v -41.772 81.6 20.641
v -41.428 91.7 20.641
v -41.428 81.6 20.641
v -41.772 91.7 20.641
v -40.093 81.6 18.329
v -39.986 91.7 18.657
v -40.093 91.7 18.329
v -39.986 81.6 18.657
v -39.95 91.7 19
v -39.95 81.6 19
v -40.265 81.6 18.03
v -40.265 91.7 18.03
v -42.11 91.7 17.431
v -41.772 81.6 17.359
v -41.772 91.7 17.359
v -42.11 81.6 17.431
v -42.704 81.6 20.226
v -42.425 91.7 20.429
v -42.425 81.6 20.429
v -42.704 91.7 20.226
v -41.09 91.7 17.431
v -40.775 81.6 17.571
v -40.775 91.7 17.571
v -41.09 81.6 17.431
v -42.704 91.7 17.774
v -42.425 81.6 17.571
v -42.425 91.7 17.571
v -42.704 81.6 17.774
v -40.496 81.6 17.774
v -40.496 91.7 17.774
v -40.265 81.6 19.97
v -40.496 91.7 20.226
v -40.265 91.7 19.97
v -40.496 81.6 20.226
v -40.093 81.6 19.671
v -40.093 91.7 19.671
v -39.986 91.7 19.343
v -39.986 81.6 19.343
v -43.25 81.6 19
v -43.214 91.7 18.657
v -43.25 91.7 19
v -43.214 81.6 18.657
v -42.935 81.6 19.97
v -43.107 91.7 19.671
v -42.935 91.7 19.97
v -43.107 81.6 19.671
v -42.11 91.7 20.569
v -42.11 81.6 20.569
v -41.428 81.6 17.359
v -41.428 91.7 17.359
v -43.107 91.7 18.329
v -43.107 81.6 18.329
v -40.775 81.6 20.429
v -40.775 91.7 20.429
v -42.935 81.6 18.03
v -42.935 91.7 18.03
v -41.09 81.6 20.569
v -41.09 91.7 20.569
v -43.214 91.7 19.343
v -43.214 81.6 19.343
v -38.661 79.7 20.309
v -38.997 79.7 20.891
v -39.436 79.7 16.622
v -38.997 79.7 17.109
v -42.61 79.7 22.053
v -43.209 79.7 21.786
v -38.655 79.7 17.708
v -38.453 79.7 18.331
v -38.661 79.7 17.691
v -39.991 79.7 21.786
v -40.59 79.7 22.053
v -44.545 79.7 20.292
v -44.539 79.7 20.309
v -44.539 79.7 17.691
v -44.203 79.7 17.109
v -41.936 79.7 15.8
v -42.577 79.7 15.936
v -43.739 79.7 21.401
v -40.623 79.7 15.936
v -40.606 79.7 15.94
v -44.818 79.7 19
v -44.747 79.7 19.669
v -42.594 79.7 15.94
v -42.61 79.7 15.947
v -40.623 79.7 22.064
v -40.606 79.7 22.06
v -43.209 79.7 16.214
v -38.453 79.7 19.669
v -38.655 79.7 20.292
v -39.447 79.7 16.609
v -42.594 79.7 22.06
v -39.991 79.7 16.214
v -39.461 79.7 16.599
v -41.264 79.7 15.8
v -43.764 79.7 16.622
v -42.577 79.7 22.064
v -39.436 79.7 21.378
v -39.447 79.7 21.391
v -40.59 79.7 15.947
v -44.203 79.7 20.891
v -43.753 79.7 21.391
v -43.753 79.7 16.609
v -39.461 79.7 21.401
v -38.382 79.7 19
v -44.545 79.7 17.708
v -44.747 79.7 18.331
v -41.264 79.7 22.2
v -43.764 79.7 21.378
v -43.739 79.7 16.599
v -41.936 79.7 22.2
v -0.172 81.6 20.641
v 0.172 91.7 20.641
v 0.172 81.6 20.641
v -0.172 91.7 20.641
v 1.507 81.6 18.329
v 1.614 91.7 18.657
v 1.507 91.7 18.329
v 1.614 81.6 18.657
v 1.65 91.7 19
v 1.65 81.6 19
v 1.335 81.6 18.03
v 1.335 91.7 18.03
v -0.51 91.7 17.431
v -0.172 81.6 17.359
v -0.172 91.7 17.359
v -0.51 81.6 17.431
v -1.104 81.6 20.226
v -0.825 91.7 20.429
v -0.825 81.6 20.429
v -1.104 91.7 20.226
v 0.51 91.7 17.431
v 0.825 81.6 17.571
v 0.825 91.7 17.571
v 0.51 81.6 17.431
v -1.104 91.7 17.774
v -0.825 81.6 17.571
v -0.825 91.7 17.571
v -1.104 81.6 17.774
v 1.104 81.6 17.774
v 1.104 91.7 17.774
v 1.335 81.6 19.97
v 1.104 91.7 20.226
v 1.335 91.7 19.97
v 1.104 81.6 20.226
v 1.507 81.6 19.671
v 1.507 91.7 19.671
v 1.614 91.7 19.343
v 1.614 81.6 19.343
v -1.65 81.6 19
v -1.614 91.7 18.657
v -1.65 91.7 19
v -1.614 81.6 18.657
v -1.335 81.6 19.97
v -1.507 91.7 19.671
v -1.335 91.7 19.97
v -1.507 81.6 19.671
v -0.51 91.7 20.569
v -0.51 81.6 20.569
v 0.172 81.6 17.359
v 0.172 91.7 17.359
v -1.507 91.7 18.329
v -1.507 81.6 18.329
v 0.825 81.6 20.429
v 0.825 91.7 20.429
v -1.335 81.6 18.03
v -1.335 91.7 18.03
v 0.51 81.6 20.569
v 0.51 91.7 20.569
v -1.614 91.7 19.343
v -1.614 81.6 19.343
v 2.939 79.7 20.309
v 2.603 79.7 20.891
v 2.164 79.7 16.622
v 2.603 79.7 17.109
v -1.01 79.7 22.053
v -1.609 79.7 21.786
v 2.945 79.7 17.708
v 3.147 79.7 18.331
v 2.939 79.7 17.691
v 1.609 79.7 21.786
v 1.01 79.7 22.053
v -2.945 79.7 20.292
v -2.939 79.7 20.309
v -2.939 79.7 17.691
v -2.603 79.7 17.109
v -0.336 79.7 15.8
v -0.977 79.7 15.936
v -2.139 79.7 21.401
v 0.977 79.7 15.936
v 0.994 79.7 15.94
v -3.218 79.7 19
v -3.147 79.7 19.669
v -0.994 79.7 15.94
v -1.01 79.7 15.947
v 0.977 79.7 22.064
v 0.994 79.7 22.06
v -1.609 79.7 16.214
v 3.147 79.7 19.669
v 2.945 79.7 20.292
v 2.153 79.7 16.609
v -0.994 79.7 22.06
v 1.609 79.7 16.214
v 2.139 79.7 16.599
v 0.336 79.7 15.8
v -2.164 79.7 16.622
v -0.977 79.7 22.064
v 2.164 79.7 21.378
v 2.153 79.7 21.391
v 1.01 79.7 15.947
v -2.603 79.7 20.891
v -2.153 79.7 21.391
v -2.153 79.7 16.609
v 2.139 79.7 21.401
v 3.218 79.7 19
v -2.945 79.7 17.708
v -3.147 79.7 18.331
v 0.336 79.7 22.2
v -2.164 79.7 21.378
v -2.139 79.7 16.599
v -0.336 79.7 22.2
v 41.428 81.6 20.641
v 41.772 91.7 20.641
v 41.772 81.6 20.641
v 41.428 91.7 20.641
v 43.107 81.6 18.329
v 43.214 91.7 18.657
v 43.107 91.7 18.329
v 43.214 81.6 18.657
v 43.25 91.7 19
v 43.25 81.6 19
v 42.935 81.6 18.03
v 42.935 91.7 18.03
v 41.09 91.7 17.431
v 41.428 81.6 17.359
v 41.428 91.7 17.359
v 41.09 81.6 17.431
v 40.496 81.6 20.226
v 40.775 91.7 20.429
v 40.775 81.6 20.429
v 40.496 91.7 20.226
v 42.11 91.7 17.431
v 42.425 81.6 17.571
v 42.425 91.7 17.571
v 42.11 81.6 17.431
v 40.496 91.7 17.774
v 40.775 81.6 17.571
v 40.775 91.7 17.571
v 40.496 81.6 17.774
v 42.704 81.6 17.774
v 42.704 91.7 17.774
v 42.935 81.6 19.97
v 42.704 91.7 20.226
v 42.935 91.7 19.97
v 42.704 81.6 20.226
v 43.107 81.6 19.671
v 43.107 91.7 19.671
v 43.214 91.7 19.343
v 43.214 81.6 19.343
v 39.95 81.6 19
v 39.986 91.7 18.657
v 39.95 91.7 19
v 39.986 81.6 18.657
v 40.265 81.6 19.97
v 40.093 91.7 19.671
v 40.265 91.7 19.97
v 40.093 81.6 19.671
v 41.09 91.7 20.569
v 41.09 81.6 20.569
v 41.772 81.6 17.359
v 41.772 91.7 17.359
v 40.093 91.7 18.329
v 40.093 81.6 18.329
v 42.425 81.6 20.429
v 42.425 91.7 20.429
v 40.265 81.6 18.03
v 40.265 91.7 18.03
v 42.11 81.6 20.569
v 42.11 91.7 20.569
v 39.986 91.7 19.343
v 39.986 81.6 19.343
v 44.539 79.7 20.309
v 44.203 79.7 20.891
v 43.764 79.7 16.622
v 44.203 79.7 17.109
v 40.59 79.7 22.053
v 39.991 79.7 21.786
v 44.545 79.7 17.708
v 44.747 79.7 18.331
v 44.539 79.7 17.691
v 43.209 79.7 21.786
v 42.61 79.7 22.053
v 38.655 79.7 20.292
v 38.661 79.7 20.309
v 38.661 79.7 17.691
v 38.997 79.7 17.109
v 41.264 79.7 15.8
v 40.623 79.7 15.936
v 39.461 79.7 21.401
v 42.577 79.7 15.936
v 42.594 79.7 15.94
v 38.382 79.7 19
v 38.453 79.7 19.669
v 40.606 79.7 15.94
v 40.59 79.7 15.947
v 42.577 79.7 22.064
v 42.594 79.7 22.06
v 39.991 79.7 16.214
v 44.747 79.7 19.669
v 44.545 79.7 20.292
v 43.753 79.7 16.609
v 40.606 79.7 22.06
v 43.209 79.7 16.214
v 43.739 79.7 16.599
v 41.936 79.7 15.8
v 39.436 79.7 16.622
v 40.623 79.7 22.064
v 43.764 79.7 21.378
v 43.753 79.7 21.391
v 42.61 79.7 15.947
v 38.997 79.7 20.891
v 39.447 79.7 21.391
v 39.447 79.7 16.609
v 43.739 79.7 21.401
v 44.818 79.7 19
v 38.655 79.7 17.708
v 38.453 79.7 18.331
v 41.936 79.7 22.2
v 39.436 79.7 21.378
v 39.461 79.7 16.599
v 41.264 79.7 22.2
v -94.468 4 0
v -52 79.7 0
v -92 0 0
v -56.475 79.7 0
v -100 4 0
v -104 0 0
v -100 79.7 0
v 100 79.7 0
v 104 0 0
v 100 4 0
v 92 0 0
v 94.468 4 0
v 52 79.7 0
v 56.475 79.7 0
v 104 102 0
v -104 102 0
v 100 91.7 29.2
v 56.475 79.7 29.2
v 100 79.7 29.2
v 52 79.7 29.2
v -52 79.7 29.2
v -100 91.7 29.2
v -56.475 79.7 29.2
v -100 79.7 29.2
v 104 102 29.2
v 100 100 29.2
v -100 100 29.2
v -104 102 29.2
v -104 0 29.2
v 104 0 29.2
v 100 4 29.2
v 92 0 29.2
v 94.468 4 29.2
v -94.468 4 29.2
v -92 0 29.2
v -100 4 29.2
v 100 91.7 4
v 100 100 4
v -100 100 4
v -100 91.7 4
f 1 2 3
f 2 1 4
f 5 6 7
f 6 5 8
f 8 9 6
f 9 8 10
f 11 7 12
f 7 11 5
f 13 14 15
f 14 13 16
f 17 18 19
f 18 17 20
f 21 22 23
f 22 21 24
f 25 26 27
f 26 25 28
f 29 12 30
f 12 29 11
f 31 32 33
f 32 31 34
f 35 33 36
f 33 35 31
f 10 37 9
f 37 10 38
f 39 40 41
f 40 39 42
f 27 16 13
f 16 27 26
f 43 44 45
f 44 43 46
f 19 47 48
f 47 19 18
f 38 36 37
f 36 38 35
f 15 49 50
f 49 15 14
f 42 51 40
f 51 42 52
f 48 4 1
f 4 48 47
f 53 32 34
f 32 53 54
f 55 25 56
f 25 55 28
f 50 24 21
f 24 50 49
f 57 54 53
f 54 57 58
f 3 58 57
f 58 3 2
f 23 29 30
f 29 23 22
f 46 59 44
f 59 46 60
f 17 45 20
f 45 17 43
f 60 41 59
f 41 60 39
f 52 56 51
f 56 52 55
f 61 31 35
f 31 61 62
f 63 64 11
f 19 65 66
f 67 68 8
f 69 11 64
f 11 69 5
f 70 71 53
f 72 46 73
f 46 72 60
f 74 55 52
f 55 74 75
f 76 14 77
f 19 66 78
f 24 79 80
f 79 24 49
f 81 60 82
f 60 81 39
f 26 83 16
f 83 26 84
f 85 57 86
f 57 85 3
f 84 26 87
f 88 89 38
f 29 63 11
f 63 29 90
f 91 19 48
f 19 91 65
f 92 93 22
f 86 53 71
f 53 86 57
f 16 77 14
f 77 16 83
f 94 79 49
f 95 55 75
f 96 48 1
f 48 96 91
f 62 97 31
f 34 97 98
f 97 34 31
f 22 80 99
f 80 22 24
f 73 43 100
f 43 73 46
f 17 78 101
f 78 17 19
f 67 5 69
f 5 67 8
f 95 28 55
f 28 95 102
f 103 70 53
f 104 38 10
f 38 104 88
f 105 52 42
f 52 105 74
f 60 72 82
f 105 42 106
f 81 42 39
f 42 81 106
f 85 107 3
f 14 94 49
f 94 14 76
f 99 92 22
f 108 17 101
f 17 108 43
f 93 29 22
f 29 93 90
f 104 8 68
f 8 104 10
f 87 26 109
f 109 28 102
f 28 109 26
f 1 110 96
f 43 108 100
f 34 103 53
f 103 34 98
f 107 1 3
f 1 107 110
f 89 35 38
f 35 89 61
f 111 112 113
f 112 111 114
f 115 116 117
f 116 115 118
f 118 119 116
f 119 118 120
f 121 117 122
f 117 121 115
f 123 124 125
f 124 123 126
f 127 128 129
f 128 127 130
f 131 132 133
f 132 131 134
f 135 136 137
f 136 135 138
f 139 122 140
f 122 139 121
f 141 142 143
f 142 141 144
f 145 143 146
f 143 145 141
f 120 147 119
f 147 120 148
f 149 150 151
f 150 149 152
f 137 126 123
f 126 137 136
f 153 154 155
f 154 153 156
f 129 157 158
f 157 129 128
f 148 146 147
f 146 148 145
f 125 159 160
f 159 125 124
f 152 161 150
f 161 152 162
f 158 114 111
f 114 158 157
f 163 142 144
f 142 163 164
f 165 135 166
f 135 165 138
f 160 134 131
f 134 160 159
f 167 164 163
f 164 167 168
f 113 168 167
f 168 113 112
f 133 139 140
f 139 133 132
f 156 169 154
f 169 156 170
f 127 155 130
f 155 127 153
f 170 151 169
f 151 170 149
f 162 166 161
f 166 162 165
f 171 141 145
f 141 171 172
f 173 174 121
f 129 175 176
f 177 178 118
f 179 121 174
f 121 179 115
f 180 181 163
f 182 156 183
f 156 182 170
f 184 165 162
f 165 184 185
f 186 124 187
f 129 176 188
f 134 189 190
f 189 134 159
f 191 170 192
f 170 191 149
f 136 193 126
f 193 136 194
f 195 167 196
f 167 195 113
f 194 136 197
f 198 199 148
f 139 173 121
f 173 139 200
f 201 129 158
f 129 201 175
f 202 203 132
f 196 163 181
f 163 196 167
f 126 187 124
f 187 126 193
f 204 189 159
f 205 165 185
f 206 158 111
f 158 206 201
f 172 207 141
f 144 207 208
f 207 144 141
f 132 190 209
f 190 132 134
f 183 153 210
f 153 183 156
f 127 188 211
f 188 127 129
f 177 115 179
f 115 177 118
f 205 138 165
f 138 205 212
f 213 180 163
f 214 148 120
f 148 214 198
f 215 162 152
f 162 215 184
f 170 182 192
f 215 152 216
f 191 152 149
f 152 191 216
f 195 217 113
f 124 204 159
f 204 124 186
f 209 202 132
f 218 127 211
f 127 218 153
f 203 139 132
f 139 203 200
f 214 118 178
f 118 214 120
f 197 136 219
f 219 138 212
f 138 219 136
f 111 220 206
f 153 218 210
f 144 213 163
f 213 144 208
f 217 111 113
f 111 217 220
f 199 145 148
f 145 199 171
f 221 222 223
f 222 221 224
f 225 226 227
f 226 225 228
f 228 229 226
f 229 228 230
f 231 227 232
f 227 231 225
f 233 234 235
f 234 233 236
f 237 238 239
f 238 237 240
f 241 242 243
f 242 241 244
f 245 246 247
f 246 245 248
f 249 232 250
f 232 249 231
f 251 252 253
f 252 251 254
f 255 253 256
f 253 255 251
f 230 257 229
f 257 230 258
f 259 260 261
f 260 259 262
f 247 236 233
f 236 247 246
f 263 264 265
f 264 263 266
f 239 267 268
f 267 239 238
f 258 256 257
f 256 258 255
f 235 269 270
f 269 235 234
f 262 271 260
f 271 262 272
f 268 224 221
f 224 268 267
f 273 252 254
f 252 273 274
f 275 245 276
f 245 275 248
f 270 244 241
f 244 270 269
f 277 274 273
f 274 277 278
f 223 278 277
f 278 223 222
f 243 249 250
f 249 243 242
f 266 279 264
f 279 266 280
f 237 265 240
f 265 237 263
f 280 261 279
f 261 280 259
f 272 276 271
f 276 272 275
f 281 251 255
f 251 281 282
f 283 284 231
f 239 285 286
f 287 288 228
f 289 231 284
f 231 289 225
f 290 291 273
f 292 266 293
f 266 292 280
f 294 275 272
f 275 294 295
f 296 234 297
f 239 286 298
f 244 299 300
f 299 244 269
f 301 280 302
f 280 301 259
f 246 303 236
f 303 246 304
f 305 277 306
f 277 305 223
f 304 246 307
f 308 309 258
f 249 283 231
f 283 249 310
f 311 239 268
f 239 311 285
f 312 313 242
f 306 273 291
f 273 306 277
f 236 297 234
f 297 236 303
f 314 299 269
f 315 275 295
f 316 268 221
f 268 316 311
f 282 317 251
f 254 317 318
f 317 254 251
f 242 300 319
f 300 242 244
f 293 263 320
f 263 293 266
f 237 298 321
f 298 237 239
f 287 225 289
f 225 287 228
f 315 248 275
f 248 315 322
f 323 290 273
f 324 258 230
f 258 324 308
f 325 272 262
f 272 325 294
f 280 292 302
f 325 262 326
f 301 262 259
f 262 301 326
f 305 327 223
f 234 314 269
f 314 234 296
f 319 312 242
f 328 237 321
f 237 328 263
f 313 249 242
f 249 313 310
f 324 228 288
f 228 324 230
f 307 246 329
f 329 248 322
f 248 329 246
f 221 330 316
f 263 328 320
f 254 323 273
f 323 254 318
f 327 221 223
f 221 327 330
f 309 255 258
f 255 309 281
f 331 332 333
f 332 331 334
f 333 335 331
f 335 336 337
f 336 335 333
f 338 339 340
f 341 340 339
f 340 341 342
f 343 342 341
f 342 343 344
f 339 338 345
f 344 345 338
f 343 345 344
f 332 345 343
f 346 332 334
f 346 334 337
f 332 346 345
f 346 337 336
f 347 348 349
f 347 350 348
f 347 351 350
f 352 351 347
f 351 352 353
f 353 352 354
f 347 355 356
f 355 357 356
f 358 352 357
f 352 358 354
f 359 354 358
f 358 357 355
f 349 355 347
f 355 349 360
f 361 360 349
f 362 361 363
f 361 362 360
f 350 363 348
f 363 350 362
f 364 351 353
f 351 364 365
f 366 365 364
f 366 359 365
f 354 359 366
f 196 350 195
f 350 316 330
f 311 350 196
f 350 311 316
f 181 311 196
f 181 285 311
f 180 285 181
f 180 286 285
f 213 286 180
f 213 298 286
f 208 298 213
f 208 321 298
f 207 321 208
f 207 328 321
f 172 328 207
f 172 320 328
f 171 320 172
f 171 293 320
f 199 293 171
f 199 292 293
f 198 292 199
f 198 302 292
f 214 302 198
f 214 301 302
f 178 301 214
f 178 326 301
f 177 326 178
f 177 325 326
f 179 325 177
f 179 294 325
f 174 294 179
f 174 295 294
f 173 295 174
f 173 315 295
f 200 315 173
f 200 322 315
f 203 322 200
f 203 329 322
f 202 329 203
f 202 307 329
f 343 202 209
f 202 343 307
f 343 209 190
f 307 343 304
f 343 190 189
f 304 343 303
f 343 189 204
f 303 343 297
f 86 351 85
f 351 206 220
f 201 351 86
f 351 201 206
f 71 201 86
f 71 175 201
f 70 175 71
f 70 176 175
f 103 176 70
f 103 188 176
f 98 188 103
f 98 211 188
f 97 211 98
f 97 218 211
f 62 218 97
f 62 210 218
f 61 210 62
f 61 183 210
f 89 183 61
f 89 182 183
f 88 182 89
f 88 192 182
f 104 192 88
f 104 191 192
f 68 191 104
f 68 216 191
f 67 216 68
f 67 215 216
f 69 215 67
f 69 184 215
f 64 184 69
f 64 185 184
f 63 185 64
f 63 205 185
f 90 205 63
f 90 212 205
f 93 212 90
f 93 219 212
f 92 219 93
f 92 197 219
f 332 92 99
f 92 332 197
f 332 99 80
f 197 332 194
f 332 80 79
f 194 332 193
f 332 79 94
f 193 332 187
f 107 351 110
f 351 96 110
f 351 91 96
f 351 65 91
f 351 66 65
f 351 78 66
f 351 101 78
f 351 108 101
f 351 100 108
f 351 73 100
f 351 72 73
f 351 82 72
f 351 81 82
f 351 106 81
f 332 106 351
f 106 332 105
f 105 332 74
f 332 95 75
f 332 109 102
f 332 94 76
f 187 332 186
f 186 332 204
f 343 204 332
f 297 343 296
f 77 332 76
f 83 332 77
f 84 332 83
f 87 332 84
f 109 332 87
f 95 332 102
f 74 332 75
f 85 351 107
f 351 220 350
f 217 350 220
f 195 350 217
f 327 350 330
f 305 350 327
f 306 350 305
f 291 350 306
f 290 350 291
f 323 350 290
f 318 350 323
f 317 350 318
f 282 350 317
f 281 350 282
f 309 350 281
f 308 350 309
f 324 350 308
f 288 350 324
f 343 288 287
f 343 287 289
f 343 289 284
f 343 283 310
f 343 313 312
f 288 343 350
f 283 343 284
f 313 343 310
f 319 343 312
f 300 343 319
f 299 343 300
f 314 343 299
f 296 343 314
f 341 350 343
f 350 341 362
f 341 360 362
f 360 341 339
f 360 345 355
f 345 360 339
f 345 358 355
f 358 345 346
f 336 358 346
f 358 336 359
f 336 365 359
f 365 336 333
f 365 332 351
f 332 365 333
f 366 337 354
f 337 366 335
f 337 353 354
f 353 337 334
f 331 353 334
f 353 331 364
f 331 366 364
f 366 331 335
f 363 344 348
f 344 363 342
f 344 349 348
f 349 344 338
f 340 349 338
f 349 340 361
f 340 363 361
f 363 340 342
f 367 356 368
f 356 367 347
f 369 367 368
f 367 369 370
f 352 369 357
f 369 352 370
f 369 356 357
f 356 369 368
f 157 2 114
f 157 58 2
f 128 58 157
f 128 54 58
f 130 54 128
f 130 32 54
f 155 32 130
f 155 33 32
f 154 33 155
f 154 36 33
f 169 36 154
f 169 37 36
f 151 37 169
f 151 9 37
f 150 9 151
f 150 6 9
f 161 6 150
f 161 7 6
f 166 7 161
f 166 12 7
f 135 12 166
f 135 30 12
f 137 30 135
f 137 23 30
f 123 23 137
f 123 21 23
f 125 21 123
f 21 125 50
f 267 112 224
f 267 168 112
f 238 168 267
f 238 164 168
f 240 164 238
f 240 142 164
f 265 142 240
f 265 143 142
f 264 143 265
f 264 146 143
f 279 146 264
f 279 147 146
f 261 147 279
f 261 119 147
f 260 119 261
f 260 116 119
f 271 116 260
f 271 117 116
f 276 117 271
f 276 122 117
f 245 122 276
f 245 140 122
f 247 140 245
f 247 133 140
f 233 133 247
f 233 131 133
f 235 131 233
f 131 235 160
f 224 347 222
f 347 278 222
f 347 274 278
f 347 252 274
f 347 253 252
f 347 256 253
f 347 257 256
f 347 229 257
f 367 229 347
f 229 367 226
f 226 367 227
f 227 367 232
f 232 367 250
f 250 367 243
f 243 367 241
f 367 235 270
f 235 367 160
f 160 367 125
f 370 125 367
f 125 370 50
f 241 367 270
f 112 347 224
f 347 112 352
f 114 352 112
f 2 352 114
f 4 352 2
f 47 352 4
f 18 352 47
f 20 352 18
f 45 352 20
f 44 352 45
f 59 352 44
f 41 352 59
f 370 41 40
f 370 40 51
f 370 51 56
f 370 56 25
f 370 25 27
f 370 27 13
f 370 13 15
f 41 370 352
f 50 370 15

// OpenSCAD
/*
* written 2018-11-20 by till busch <buti@bux.at>
* version 1.1.3, 2018-11-22
*/

// top edge of board [mm]
height              = 100;    // [50:150]
// width of board, depth of finished stand [mm]
board_width         = 200;    // [150:300]
// height of the printed element [mm]
extrusion_height    =  30;    // [20:30]
// thickness of wooden board, mm
board_height        =   8.3;  // [7:0.1:20]
// thickness of wall below board, for stability and to allow for too long screws [mm]
wall_below_board    =  12;    // [4:20]
// preferred shape of foot [mm]
foot_width          =  12;    // [6:50]
// wall thickness, for stability [mm]
walls               =   4;    // [3:6]
// top wall can be thinner [mm]
top_wall            =   2;    // [0:6]
// hole diameter for screws [mm]
screw_diameter      =   3.3;  // [1:0.1:5]
// height of countersunk head [mm]
screw_head_height   =   2;    // [1:0.1:3]

// thingiverse customizer does not support booleans yet
// enable rounded corners
rounded_corners     = "no";  // [no,yes]
/* [Rounded Corners] */
corner_radius_obtuse = 10;    // [1:30]
corner_radius_sharp  =  3;    // [1:6]

top_width = board_width+2*walls;
bottom_width = top_width;

module main_shape() {
    // calculate x of last point from cutout
    x1 = -bottom_width/2+foot_width;
    y1 = 0;
    x2 = -top_width/4;
    y2 = height-board_height-wall_below_board;
    m = (y2-y1)/(x2-x1);
    yt = (height-board_height-wall_below_board+walls);
    x = ((yt-y1)/m)+x1;    
    points_cut = [
        [-top_width/2, height-board_height-wall_below_board+walls],
        [-bottom_width/2, 0],
        [-bottom_width/2+foot_width, 0],
        [x, height-board_height-wall_below_board+walls],
    ];
    points = [
        [-bottom_width/2, 0],
        [-bottom_width/2+foot_width, 0],
        [-top_width/4, height-board_height-wall_below_board],

        [top_width/4, height-board_height-wall_below_board],
        [bottom_width/2-foot_width, 0],
        [bottom_width/2, 0],

        [top_width/2, height+top_wall],
        [-top_width/2, height+top_wall]
    ];

    if(rounded_corners == "yes") {
        r2 = corner_radius_obtuse;
        r1 = corner_radius_sharp;
        $fs = 0.1;
        $fn = 48;
        difference() {
            offset(r = -r2) offset(r=r2) offset(r = 3) offset(r=-3)
                polygon(points = points);
            offset(r = r1) offset(r=-r1) offset(r = -walls)
                polygon(points = points_cut);
            mirror([1, 0, 0]) offset(r = r1) offset(r=-r1) offset(r = -walls)
                polygon(points = points_cut);
        }
    } else {
        difference() {
            polygon(points = points);
            offset(r = -walls) polygon(points = points_cut);
            mirror([1, 0, 0]) offset(r = -walls) polygon(points = points_cut);
        }
    }
}

module screw_hole() {
    union() {
        rotate([-90, 0, 0]) cylinder(h=wall_below_board*1.2, d=screw_diameter);
        rotate([-90, 0, 0]) cylinder(h=screw_head_height, d1=screw_diameter*2, d2=screw_diameter);
        rotate([90, 0, 0]) cylinder(h=5, d=screw_diameter*2);
    }
}


difference() {
    /*
    // "bevel"
    union() {
        linear_extrude(height=0.2) offset(r=-0.5) main_shape();
        translate([0, 0, 0.2])
            linear_extrude(height=0.2) offset(r=-0.25) main_shape();

        translate([0, 0, extrusion_height-0.2])
            linear_extrude(height=0.2) offset(r=-0.5) main_shape();
        translate([0, 0, extrusion_height-0.4])
            linear_extrude(height=0.2) offset(r=-0.25) main_shape();

        translate([0, 0, 0.4])
            linear_extrude(height=extrusion_height-0.8) {
                main_shape();
    }
    */
    linear_extrude(height=extrusion_height-0.8) {
        main_shape();
    }
    // board
    translate([-top_width/2+walls, height-board_height, walls]) {
        cube(size=[board_width, board_height, extrusion_height]);
    }
    // screw holes
    sy = height-board_height-wall_below_board-0.1;
    sz = extrusion_height/2 + walls;
    translate([-top_width/5, sy, sz]) screw_hole($fs=0.2);
    translate([0, sy, sz]) screw_hole($fs=0.2);
    translate([top_width/5, sy, sz]) screw_hole($fs=0.2);
}
